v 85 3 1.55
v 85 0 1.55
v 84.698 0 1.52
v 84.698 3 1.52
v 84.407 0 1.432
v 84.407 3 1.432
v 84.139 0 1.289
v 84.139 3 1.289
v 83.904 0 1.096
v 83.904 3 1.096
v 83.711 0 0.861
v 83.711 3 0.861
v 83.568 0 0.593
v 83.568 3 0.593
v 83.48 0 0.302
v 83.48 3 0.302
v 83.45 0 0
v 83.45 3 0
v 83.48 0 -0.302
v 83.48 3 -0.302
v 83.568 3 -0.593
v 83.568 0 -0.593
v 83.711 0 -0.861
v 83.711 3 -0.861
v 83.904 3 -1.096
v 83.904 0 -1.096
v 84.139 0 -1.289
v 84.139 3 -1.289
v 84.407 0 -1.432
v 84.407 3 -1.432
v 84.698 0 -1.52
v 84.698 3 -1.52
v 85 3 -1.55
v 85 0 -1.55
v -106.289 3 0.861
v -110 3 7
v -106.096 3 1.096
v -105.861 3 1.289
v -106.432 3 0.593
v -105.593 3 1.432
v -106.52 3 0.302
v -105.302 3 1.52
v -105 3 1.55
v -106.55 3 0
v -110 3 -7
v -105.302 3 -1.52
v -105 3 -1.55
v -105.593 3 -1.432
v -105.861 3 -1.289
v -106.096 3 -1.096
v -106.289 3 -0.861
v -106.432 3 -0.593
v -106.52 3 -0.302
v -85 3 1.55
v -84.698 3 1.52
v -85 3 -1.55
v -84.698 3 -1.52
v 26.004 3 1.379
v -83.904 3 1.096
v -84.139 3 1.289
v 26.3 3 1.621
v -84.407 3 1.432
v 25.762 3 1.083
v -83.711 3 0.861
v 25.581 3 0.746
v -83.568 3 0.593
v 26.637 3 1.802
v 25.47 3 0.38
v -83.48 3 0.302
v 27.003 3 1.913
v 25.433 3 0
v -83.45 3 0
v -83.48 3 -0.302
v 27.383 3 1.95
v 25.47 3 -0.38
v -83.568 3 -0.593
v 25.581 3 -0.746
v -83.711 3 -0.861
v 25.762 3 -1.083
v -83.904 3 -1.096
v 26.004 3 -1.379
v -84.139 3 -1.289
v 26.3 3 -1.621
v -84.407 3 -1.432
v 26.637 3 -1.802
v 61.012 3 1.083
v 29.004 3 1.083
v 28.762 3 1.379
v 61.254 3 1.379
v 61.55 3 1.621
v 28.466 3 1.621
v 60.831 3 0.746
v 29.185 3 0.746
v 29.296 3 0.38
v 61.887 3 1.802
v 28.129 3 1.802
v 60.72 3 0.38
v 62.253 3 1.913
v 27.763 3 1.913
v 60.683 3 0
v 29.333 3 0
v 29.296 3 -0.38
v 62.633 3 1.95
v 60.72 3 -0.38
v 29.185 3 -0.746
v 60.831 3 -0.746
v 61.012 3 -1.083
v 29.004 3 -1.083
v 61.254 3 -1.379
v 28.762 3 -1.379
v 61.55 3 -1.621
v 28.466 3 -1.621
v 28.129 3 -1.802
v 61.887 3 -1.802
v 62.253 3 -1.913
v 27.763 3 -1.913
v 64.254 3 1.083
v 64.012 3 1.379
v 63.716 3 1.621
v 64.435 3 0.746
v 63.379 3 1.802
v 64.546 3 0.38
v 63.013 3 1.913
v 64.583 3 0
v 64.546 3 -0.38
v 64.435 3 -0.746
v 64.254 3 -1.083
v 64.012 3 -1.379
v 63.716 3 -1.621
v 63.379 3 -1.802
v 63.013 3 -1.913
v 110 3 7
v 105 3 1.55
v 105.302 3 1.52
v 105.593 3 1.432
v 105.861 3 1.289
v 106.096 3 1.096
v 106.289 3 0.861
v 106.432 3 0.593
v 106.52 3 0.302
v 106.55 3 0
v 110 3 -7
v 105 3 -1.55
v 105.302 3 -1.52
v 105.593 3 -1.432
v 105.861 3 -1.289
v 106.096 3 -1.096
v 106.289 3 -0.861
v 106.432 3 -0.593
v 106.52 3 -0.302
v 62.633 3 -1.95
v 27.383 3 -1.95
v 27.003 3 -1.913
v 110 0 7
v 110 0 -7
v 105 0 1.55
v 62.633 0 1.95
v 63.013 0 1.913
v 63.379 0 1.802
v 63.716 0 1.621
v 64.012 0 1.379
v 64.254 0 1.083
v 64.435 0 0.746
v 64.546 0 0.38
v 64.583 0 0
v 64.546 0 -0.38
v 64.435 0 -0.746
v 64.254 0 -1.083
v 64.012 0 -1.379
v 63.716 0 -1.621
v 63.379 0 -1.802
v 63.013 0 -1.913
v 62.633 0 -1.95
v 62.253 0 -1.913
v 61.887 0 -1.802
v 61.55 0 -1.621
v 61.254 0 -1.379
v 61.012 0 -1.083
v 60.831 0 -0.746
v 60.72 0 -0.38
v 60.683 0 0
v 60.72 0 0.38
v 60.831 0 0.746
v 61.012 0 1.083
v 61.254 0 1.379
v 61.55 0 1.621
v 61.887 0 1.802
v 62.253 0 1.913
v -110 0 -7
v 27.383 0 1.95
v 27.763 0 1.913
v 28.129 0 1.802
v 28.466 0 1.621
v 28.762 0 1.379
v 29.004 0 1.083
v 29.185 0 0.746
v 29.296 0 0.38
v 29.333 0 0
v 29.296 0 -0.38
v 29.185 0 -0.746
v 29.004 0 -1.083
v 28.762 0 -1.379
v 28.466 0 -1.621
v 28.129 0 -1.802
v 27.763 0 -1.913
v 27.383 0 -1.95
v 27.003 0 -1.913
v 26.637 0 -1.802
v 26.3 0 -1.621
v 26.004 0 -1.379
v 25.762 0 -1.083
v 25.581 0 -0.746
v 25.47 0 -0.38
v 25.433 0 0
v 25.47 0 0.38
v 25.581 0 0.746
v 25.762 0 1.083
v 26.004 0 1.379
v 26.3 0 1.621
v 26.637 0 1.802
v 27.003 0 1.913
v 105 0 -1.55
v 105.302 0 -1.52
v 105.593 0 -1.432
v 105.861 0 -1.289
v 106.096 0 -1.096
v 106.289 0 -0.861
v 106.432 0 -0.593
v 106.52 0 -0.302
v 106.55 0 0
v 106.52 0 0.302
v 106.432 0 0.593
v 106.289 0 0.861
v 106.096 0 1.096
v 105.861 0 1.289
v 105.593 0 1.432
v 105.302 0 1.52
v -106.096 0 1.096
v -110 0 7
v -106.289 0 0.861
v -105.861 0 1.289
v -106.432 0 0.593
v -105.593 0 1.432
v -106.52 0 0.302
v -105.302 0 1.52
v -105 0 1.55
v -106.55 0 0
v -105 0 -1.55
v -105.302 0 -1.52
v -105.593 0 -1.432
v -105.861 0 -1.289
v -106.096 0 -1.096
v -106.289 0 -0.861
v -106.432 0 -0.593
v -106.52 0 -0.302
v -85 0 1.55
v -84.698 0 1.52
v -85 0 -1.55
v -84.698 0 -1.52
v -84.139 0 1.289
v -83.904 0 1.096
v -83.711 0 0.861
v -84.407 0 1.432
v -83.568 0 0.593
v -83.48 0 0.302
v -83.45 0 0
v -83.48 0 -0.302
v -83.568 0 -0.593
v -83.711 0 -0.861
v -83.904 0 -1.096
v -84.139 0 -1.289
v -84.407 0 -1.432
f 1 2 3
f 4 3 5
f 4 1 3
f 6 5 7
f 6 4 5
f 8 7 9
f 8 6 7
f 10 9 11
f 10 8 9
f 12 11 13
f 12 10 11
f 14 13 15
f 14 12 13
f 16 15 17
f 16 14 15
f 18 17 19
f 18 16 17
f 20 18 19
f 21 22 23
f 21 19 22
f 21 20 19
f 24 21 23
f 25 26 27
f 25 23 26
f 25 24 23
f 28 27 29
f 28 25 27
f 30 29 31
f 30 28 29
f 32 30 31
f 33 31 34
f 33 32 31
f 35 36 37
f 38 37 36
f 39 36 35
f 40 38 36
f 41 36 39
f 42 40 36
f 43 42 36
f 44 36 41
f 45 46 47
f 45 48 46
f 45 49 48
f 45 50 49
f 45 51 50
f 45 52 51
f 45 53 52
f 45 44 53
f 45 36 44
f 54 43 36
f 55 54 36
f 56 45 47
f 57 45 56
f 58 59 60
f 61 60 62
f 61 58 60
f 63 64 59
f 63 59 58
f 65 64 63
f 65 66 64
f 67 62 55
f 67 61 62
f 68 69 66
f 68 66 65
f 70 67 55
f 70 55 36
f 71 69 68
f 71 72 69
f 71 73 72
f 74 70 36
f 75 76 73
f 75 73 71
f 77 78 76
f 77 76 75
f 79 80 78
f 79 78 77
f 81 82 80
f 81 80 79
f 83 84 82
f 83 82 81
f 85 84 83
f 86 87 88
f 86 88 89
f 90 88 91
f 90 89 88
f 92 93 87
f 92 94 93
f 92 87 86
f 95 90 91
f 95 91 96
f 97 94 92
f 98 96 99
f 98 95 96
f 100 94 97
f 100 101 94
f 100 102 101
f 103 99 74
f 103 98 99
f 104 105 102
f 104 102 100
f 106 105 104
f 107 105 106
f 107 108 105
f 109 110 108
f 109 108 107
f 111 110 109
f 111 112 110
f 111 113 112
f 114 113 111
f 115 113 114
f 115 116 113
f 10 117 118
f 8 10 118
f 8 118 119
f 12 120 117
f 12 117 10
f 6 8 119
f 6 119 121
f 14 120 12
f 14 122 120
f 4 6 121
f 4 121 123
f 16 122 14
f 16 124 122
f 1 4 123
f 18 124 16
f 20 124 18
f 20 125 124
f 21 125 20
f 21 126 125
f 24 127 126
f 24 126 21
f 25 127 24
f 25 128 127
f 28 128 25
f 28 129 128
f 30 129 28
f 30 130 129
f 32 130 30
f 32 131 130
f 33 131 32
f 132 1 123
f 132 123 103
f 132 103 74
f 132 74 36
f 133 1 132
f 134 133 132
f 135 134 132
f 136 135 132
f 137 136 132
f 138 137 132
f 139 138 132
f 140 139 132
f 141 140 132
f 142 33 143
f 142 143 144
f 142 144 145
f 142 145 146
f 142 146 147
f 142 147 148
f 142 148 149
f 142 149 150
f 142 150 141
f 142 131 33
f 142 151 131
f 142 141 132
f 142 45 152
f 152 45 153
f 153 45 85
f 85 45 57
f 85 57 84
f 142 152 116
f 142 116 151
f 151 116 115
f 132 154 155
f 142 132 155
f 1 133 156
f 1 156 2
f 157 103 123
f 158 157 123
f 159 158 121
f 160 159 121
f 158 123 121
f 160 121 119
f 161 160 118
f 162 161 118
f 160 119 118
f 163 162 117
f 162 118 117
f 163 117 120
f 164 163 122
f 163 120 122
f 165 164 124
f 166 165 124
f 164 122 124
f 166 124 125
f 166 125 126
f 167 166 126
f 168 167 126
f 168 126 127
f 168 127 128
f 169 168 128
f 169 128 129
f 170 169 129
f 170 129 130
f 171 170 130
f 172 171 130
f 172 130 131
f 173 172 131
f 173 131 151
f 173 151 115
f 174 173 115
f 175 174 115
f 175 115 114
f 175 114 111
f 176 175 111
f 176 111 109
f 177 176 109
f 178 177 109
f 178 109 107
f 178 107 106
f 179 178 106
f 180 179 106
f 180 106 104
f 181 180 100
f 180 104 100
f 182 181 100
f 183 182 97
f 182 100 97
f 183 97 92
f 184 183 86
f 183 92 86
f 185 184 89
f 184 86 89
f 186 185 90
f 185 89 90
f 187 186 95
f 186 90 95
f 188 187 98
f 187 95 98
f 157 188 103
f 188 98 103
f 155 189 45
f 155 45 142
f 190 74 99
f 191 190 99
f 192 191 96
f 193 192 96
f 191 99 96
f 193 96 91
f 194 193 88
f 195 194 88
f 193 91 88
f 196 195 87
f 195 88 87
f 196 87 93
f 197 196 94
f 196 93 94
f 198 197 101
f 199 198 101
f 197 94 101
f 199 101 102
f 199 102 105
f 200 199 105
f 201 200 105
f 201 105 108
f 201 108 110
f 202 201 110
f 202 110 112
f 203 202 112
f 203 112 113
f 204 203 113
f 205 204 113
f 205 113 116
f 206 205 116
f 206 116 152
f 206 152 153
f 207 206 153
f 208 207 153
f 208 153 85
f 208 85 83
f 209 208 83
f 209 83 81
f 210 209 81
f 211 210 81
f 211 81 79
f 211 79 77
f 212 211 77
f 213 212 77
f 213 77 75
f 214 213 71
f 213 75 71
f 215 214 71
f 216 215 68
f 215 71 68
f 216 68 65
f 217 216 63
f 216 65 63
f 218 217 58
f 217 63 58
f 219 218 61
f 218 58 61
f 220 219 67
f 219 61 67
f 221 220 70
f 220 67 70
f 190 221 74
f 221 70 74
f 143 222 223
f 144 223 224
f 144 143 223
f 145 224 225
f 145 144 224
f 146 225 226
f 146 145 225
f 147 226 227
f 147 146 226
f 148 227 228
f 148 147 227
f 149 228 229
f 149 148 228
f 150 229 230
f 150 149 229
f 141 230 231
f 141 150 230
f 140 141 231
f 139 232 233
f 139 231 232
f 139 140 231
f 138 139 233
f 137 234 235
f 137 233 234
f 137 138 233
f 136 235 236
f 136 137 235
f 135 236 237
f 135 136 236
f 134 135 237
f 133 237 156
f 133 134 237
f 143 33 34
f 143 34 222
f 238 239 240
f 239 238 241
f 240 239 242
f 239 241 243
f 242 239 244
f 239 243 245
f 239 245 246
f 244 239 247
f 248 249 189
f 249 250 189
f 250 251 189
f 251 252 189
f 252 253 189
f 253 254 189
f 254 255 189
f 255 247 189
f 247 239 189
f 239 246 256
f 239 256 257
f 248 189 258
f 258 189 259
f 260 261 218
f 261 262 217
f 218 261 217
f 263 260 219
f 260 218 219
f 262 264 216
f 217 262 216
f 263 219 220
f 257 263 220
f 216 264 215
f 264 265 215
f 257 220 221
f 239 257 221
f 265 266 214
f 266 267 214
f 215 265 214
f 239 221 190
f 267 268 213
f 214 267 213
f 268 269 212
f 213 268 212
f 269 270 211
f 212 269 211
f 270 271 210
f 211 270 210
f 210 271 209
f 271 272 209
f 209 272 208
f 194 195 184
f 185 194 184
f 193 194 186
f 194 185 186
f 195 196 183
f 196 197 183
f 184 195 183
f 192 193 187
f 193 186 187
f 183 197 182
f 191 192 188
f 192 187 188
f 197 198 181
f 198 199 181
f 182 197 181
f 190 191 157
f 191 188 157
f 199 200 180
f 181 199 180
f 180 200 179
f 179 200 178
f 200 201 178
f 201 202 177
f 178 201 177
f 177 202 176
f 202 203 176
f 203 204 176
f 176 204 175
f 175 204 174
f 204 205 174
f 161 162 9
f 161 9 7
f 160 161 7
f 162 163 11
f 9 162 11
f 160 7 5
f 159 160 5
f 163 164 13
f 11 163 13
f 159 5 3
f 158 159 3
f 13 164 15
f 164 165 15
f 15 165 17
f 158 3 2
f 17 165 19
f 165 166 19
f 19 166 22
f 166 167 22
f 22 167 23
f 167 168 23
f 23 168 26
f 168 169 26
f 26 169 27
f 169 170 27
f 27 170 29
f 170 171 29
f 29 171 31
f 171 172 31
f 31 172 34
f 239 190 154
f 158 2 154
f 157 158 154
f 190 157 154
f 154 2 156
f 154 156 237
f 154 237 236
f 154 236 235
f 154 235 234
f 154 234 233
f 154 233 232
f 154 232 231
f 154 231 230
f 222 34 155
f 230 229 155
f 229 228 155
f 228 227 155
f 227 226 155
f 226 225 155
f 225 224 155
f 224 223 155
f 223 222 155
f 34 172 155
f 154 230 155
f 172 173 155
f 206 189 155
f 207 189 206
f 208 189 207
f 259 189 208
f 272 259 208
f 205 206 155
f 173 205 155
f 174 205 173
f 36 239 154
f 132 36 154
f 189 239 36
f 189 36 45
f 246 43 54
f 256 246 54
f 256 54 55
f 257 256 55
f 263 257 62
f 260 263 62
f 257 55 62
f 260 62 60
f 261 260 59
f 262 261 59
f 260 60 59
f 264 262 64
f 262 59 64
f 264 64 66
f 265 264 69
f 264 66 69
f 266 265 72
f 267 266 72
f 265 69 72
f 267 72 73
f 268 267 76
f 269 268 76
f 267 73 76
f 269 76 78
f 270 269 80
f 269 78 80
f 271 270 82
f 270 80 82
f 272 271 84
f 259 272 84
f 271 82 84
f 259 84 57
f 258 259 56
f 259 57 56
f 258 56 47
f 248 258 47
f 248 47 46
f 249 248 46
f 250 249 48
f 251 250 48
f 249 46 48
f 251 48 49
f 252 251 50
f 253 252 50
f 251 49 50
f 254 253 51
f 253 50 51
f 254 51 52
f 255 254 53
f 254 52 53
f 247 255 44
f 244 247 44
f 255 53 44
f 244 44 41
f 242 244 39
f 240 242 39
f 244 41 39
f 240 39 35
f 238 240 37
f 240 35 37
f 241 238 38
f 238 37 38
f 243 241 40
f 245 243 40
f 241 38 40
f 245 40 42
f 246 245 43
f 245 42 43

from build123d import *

# Parameters (mm, degrees)
SKIZZE1_W                       = 220
SKIZZE1_H                       = 14
AUFSATZ_LINEAR_AUSTRAGEN1_DEPTH = 3
SCHNITT_LINEAR_AUSTRAGEN1_DEPTH = 111.263321191
SCHNITT_LINEAR_AUSTRAGEN2_REACH = 112.263
SKIZZE3_R                       = 1.95


with BuildPart() as part:
    # Skizze1 → Aufsatz-Linear austragen1 (new body)
    with BuildSketch(Plane(origin=(0, 0, 0), x_dir=(1, 0, 0), z_dir=(0, 1, 0))):
        Rectangle(SKIZZE1_W, SKIZZE1_H)
    extrude(amount=AUFSATZ_LINEAR_AUSTRAGEN1_DEPTH)

    # Skizze2 → Schnitt-Linear austragen1 (cut, through all)
    with BuildSketch(Plane(origin=(0, 3, 0), x_dir=(1, 0, 0), z_dir=(0, 1, 0))):
        with BuildLine():
            Line((85, 1.55), (105, 1.55))
            ThreePointArc((105, 1.55), (106.55, 0), (105, -1.55))
            Line((105, -1.55), (85, -1.55))
            ThreePointArc((85, -1.55), (83.45, 0), (85, 1.55))
        make_face()
    schnitt_linear_austragen1 = extrude(amount=-SCHNITT_LINEAR_AUSTRAGEN1_DEPTH, mode=Mode.SUBTRACT)

    # Spiegeln1: Schnitt-Linear austragen1 across plane
    add(schnitt_linear_austragen1.mirror(Plane(origin=(0, 0, 0), x_dir=(0, 0, 1), z_dir=(1, 0, 0))), mode=Mode.SUBTRACT)

    # Skizze3 → Schnitt-Linear austragen2 (cut, up to next)
    with BuildSketch(Plane(origin=(0, 3, 0), x_dir=(1, 0, 0), z_dir=(0, 1, 0)), mode=Mode.PRIVATE) as schnitt_linear_austragen2_sk1:
        with Locations(Location((27.383, 0, 0), (0, 0, 270))):
            Circle(SKIZZE3_R)
    schnitt_linear_austragen2_tool1 = extrude(schnitt_linear_austragen2_sk1.sketch, amount=-SCHNITT_LINEAR_AUSTRAGEN2_REACH, mode=Mode.PRIVATE) & part.part
    # Skizze3 → Schnitt-Linear austragen2 (cut, up to next)
    with BuildSketch(Plane(origin=(0, 3, 0), x_dir=(1, 0, 0), z_dir=(0, 1, 0)), mode=Mode.PRIVATE) as schnitt_linear_austragen2_sk2:
        with Locations(Location((62.633, 0, 0), (0, 0, 270))):
            Circle(SKIZZE3_R)
    schnitt_linear_austragen2_tool2 = extrude(schnitt_linear_austragen2_sk2.sketch, amount=-SCHNITT_LINEAR_AUSTRAGEN2_REACH, mode=Mode.PRIVATE) & part.part
    add(schnitt_linear_austragen2_tool1.solids().sort_by_distance((27.383, 3, 0))[0], mode=Mode.SUBTRACT)
    add(schnitt_linear_austragen2_tool2.solids().sort_by_distance((62.633, 3, 0))[0], mode=Mode.SUBTRACT)


solid = part.part
